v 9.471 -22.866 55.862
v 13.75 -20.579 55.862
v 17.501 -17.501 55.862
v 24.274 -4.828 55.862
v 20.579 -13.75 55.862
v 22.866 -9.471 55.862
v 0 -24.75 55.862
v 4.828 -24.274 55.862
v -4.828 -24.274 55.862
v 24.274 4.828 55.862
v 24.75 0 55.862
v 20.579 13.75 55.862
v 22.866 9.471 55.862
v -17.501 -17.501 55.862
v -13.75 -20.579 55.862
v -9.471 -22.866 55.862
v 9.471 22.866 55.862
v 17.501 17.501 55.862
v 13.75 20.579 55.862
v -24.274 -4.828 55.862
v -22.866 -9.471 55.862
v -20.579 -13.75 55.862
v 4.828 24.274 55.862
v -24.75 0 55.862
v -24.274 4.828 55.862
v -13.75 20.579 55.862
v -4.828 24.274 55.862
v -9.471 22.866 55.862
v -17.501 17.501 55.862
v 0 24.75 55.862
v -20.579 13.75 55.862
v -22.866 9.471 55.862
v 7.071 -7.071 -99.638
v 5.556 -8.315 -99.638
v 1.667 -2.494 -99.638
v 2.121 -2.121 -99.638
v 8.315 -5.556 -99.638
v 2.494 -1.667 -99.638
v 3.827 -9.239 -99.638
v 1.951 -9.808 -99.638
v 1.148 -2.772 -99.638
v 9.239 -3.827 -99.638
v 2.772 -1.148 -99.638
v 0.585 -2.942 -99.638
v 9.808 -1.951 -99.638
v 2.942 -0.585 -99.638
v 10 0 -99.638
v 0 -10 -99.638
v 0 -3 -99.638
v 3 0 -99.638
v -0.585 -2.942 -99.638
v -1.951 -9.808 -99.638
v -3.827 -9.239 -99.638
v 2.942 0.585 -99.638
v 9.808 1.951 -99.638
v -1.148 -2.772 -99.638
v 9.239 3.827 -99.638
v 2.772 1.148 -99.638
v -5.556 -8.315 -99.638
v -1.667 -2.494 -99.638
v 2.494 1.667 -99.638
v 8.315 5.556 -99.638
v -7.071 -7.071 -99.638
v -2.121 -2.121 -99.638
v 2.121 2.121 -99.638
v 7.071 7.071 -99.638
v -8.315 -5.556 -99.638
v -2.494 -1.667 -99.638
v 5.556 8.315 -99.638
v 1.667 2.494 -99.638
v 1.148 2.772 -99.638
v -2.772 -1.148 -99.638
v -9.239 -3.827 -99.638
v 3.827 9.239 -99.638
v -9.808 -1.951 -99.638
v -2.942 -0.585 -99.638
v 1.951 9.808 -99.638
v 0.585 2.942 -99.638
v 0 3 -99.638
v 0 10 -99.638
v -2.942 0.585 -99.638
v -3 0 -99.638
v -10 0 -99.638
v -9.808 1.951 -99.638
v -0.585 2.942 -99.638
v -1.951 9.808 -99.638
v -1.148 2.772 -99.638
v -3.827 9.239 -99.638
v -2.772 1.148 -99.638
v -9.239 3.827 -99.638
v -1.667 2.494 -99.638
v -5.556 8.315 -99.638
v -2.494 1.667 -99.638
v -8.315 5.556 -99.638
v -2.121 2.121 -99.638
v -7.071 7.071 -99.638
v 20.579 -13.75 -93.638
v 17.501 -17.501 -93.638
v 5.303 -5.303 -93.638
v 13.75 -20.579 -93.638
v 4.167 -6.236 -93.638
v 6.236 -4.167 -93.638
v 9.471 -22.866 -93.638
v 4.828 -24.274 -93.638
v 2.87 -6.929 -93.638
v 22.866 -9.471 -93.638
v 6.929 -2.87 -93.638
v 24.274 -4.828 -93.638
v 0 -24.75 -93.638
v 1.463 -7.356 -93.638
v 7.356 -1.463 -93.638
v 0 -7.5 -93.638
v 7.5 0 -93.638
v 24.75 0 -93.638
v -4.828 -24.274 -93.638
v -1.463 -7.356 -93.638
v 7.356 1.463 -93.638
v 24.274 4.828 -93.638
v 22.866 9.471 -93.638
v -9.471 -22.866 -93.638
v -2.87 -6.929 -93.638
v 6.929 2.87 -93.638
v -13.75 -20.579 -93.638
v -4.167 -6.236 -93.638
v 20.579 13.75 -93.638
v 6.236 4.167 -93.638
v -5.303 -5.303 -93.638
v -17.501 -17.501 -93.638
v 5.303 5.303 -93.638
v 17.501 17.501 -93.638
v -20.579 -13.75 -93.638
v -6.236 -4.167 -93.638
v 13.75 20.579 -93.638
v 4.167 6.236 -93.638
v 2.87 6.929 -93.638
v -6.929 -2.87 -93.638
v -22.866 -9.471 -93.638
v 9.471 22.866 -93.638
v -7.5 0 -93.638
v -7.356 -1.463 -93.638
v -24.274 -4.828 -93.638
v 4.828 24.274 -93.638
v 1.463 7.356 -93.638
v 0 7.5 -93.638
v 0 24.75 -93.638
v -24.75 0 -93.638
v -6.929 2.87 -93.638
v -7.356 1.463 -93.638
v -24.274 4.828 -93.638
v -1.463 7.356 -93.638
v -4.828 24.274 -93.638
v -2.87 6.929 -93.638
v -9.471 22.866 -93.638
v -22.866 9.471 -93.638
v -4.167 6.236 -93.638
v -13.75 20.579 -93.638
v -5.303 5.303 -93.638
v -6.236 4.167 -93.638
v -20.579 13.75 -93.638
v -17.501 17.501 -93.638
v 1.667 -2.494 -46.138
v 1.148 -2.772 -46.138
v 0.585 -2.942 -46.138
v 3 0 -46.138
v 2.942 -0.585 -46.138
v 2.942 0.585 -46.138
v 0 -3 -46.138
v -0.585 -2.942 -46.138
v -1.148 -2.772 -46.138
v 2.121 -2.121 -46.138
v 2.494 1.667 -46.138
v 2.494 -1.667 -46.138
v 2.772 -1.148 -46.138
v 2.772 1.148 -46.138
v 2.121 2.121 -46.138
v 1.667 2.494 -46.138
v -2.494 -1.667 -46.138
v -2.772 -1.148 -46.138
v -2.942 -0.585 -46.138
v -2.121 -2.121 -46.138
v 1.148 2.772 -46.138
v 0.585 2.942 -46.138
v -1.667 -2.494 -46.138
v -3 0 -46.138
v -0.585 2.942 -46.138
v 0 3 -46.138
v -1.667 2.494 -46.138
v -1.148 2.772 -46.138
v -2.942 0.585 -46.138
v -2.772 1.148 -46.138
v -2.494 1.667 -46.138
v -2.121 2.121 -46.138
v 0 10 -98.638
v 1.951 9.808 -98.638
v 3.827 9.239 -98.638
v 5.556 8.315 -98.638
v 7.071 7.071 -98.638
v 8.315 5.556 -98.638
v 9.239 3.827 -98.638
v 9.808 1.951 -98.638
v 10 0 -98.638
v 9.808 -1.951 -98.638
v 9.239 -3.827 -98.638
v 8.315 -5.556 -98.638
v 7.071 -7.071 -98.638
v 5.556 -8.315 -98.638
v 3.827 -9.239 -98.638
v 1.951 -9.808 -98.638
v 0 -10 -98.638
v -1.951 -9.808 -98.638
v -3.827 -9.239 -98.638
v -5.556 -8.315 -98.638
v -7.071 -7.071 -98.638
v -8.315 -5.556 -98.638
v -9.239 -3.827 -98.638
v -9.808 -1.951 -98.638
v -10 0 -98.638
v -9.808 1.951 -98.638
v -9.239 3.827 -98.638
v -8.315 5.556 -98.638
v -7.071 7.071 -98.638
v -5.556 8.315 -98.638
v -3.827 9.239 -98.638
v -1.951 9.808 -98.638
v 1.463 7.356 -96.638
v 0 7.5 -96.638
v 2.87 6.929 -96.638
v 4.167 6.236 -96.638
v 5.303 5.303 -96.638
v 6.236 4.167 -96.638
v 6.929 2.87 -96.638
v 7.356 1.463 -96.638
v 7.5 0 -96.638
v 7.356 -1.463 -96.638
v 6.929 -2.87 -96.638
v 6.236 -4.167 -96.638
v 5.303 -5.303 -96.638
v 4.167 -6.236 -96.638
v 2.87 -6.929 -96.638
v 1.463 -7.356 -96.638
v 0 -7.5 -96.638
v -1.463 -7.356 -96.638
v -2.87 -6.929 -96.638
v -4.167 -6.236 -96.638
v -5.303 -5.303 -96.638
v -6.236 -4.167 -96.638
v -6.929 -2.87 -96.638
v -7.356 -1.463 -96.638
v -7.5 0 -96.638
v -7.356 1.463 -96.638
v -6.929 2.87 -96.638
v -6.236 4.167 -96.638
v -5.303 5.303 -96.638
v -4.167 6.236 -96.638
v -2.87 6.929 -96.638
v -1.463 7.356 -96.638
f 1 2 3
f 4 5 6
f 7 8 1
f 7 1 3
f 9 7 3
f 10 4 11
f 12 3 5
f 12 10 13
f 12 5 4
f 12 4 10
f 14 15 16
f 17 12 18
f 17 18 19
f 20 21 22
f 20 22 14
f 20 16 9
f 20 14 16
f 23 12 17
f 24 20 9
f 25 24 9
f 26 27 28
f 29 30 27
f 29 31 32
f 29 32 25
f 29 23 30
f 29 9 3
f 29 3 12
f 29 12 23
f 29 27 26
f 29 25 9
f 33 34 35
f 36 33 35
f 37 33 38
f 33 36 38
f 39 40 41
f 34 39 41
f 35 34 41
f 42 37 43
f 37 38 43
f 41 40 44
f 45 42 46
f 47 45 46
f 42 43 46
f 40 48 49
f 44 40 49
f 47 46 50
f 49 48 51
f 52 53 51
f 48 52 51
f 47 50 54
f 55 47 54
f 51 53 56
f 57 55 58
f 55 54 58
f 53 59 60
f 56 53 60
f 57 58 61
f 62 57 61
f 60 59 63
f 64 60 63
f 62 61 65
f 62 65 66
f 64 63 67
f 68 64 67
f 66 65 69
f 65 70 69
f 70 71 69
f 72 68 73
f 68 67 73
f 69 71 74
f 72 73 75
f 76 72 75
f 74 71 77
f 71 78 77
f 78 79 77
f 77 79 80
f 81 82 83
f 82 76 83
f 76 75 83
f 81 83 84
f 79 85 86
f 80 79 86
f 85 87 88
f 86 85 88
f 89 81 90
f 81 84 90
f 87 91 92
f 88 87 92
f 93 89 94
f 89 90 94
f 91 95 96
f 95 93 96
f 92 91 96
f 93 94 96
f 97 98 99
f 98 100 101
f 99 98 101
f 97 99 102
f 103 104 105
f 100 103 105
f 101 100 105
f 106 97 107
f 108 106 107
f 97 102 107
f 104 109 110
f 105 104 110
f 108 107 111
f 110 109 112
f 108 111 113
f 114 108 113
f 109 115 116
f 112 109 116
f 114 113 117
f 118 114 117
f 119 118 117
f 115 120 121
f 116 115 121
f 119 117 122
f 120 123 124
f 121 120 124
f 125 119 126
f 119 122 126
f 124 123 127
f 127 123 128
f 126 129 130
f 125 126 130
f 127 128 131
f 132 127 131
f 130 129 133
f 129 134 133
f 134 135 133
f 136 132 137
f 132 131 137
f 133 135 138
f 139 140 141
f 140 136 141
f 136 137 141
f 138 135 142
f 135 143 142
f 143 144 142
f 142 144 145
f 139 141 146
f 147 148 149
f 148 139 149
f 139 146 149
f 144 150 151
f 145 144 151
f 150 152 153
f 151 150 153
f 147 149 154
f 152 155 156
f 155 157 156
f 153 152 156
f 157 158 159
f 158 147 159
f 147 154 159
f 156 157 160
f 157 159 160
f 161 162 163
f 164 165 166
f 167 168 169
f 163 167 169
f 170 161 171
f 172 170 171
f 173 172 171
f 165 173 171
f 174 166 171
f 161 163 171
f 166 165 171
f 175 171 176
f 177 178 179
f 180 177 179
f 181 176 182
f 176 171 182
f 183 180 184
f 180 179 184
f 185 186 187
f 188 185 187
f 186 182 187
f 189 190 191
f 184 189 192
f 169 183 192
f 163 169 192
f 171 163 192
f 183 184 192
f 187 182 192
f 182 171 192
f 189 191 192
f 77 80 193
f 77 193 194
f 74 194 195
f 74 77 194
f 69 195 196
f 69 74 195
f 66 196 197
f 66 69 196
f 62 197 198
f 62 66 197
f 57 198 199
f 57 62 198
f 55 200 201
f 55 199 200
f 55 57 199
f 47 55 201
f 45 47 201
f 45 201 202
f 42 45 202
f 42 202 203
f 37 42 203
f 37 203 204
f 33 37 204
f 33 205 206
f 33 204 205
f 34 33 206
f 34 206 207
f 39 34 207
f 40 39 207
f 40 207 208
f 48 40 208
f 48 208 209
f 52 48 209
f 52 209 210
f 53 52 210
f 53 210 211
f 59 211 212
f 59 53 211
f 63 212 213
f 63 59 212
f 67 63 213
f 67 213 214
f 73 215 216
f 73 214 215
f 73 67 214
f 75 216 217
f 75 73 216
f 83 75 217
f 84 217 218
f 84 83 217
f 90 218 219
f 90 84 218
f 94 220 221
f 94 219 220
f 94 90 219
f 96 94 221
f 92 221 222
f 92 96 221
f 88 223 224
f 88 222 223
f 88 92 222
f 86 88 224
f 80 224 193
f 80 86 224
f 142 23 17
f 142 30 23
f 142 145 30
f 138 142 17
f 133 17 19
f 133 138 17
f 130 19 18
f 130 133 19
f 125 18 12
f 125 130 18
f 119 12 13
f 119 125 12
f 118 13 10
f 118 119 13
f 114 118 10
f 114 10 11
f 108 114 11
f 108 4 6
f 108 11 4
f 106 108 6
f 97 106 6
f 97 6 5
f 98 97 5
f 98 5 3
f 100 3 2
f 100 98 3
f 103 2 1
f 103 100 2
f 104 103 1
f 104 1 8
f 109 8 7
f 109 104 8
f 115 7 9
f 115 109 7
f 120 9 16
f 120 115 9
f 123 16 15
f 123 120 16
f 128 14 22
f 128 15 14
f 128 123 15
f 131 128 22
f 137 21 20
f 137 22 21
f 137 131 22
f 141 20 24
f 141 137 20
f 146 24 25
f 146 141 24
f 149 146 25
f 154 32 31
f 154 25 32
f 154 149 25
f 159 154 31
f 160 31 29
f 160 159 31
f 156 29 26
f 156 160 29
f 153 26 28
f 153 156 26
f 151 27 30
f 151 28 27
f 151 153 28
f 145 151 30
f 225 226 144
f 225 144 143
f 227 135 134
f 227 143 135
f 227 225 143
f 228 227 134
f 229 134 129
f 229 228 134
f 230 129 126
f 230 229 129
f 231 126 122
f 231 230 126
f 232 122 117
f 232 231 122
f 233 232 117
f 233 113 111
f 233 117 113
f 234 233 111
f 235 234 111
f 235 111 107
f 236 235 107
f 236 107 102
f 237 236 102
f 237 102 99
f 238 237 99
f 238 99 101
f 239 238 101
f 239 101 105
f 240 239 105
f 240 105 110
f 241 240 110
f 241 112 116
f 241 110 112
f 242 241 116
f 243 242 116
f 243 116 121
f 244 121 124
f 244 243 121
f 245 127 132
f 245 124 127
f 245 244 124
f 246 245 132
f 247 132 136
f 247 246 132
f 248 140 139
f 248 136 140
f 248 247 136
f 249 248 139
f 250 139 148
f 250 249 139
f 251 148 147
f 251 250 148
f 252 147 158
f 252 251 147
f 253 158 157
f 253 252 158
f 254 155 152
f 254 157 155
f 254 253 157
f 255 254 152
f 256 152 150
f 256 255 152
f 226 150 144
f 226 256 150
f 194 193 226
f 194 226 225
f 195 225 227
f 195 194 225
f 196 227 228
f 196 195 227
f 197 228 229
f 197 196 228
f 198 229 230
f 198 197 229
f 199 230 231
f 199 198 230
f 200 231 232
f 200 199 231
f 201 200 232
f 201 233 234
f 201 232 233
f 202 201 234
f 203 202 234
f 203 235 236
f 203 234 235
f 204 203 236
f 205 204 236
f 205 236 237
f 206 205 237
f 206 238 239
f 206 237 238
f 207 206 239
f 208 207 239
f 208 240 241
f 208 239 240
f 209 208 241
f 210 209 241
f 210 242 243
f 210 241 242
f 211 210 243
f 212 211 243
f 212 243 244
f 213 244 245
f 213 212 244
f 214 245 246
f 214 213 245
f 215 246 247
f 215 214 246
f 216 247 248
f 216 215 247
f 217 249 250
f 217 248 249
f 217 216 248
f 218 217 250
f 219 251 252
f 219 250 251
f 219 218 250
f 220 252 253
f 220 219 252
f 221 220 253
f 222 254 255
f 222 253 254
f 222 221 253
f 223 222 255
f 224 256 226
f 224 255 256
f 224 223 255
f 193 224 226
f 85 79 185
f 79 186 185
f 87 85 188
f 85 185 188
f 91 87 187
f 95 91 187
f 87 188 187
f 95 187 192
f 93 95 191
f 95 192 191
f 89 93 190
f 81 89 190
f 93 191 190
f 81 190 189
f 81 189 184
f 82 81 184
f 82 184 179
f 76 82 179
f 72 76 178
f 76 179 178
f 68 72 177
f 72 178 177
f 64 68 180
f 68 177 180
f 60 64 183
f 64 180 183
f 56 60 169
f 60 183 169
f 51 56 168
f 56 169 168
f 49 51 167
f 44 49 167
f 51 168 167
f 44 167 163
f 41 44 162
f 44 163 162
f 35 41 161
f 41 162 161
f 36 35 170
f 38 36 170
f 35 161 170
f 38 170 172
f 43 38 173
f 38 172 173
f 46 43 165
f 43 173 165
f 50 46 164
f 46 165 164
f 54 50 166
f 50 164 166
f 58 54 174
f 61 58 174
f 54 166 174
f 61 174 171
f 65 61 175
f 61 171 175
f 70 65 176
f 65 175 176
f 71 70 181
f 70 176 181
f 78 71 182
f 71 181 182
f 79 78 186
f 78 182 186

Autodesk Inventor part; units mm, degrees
ref_plane "YZ Plane" through (0, 0, 0) normal (1, 0, 0) x (0, 1, 0)
ref_plane "XY Plane" through (0, 0, 0) normal (0, 0, 1) x (1, 0, 0)
sketch "Sketch1" plane through (0, 0, 0) normal (1, 0, 0) x (0, 1, 0)
  line L0 (0, -54.8873) -> (0, 55.2482)
  line L1 (0, 55.8624) -> (24.75, 55.8624)
  line L2 (24.75, 55.8624) -> (24.75, -93.6376)
  line L3 (24.75, -93.6376) -> (7.5, -93.6376)
  line L4 (7.5, -93.6376) -> (7.5, -96.6376)
  line L5 (7.5, -96.6376) -> (10, -98.6376)
  line L6 (10, -98.6376) -> (10, -99.6376)
  line L7 (10, -99.6376) -> (0, -99.6376)
  line L8 (0, -99.6376) -> (0, 55.8624)
  point P0 (0, 0)
  dimension "d0" = 155.5
  dimension "d1" = 24.75
  dimension "d2" = 7.5
  dimension "d3" = 10
  dimension "d4" = 6
  dimension "d5" = 1
  dimension "d6" = 2
revolve "Revolution1" add sketch "Sketch1" angle 360 about axis through (0, 0, -54.8873) along (0, 0, 1)
hole "Hole1" at (0, 0, -99.6376) direction (0, 0, 1) diameter 6 depth 53.5
properties part number "solenoid_body"
